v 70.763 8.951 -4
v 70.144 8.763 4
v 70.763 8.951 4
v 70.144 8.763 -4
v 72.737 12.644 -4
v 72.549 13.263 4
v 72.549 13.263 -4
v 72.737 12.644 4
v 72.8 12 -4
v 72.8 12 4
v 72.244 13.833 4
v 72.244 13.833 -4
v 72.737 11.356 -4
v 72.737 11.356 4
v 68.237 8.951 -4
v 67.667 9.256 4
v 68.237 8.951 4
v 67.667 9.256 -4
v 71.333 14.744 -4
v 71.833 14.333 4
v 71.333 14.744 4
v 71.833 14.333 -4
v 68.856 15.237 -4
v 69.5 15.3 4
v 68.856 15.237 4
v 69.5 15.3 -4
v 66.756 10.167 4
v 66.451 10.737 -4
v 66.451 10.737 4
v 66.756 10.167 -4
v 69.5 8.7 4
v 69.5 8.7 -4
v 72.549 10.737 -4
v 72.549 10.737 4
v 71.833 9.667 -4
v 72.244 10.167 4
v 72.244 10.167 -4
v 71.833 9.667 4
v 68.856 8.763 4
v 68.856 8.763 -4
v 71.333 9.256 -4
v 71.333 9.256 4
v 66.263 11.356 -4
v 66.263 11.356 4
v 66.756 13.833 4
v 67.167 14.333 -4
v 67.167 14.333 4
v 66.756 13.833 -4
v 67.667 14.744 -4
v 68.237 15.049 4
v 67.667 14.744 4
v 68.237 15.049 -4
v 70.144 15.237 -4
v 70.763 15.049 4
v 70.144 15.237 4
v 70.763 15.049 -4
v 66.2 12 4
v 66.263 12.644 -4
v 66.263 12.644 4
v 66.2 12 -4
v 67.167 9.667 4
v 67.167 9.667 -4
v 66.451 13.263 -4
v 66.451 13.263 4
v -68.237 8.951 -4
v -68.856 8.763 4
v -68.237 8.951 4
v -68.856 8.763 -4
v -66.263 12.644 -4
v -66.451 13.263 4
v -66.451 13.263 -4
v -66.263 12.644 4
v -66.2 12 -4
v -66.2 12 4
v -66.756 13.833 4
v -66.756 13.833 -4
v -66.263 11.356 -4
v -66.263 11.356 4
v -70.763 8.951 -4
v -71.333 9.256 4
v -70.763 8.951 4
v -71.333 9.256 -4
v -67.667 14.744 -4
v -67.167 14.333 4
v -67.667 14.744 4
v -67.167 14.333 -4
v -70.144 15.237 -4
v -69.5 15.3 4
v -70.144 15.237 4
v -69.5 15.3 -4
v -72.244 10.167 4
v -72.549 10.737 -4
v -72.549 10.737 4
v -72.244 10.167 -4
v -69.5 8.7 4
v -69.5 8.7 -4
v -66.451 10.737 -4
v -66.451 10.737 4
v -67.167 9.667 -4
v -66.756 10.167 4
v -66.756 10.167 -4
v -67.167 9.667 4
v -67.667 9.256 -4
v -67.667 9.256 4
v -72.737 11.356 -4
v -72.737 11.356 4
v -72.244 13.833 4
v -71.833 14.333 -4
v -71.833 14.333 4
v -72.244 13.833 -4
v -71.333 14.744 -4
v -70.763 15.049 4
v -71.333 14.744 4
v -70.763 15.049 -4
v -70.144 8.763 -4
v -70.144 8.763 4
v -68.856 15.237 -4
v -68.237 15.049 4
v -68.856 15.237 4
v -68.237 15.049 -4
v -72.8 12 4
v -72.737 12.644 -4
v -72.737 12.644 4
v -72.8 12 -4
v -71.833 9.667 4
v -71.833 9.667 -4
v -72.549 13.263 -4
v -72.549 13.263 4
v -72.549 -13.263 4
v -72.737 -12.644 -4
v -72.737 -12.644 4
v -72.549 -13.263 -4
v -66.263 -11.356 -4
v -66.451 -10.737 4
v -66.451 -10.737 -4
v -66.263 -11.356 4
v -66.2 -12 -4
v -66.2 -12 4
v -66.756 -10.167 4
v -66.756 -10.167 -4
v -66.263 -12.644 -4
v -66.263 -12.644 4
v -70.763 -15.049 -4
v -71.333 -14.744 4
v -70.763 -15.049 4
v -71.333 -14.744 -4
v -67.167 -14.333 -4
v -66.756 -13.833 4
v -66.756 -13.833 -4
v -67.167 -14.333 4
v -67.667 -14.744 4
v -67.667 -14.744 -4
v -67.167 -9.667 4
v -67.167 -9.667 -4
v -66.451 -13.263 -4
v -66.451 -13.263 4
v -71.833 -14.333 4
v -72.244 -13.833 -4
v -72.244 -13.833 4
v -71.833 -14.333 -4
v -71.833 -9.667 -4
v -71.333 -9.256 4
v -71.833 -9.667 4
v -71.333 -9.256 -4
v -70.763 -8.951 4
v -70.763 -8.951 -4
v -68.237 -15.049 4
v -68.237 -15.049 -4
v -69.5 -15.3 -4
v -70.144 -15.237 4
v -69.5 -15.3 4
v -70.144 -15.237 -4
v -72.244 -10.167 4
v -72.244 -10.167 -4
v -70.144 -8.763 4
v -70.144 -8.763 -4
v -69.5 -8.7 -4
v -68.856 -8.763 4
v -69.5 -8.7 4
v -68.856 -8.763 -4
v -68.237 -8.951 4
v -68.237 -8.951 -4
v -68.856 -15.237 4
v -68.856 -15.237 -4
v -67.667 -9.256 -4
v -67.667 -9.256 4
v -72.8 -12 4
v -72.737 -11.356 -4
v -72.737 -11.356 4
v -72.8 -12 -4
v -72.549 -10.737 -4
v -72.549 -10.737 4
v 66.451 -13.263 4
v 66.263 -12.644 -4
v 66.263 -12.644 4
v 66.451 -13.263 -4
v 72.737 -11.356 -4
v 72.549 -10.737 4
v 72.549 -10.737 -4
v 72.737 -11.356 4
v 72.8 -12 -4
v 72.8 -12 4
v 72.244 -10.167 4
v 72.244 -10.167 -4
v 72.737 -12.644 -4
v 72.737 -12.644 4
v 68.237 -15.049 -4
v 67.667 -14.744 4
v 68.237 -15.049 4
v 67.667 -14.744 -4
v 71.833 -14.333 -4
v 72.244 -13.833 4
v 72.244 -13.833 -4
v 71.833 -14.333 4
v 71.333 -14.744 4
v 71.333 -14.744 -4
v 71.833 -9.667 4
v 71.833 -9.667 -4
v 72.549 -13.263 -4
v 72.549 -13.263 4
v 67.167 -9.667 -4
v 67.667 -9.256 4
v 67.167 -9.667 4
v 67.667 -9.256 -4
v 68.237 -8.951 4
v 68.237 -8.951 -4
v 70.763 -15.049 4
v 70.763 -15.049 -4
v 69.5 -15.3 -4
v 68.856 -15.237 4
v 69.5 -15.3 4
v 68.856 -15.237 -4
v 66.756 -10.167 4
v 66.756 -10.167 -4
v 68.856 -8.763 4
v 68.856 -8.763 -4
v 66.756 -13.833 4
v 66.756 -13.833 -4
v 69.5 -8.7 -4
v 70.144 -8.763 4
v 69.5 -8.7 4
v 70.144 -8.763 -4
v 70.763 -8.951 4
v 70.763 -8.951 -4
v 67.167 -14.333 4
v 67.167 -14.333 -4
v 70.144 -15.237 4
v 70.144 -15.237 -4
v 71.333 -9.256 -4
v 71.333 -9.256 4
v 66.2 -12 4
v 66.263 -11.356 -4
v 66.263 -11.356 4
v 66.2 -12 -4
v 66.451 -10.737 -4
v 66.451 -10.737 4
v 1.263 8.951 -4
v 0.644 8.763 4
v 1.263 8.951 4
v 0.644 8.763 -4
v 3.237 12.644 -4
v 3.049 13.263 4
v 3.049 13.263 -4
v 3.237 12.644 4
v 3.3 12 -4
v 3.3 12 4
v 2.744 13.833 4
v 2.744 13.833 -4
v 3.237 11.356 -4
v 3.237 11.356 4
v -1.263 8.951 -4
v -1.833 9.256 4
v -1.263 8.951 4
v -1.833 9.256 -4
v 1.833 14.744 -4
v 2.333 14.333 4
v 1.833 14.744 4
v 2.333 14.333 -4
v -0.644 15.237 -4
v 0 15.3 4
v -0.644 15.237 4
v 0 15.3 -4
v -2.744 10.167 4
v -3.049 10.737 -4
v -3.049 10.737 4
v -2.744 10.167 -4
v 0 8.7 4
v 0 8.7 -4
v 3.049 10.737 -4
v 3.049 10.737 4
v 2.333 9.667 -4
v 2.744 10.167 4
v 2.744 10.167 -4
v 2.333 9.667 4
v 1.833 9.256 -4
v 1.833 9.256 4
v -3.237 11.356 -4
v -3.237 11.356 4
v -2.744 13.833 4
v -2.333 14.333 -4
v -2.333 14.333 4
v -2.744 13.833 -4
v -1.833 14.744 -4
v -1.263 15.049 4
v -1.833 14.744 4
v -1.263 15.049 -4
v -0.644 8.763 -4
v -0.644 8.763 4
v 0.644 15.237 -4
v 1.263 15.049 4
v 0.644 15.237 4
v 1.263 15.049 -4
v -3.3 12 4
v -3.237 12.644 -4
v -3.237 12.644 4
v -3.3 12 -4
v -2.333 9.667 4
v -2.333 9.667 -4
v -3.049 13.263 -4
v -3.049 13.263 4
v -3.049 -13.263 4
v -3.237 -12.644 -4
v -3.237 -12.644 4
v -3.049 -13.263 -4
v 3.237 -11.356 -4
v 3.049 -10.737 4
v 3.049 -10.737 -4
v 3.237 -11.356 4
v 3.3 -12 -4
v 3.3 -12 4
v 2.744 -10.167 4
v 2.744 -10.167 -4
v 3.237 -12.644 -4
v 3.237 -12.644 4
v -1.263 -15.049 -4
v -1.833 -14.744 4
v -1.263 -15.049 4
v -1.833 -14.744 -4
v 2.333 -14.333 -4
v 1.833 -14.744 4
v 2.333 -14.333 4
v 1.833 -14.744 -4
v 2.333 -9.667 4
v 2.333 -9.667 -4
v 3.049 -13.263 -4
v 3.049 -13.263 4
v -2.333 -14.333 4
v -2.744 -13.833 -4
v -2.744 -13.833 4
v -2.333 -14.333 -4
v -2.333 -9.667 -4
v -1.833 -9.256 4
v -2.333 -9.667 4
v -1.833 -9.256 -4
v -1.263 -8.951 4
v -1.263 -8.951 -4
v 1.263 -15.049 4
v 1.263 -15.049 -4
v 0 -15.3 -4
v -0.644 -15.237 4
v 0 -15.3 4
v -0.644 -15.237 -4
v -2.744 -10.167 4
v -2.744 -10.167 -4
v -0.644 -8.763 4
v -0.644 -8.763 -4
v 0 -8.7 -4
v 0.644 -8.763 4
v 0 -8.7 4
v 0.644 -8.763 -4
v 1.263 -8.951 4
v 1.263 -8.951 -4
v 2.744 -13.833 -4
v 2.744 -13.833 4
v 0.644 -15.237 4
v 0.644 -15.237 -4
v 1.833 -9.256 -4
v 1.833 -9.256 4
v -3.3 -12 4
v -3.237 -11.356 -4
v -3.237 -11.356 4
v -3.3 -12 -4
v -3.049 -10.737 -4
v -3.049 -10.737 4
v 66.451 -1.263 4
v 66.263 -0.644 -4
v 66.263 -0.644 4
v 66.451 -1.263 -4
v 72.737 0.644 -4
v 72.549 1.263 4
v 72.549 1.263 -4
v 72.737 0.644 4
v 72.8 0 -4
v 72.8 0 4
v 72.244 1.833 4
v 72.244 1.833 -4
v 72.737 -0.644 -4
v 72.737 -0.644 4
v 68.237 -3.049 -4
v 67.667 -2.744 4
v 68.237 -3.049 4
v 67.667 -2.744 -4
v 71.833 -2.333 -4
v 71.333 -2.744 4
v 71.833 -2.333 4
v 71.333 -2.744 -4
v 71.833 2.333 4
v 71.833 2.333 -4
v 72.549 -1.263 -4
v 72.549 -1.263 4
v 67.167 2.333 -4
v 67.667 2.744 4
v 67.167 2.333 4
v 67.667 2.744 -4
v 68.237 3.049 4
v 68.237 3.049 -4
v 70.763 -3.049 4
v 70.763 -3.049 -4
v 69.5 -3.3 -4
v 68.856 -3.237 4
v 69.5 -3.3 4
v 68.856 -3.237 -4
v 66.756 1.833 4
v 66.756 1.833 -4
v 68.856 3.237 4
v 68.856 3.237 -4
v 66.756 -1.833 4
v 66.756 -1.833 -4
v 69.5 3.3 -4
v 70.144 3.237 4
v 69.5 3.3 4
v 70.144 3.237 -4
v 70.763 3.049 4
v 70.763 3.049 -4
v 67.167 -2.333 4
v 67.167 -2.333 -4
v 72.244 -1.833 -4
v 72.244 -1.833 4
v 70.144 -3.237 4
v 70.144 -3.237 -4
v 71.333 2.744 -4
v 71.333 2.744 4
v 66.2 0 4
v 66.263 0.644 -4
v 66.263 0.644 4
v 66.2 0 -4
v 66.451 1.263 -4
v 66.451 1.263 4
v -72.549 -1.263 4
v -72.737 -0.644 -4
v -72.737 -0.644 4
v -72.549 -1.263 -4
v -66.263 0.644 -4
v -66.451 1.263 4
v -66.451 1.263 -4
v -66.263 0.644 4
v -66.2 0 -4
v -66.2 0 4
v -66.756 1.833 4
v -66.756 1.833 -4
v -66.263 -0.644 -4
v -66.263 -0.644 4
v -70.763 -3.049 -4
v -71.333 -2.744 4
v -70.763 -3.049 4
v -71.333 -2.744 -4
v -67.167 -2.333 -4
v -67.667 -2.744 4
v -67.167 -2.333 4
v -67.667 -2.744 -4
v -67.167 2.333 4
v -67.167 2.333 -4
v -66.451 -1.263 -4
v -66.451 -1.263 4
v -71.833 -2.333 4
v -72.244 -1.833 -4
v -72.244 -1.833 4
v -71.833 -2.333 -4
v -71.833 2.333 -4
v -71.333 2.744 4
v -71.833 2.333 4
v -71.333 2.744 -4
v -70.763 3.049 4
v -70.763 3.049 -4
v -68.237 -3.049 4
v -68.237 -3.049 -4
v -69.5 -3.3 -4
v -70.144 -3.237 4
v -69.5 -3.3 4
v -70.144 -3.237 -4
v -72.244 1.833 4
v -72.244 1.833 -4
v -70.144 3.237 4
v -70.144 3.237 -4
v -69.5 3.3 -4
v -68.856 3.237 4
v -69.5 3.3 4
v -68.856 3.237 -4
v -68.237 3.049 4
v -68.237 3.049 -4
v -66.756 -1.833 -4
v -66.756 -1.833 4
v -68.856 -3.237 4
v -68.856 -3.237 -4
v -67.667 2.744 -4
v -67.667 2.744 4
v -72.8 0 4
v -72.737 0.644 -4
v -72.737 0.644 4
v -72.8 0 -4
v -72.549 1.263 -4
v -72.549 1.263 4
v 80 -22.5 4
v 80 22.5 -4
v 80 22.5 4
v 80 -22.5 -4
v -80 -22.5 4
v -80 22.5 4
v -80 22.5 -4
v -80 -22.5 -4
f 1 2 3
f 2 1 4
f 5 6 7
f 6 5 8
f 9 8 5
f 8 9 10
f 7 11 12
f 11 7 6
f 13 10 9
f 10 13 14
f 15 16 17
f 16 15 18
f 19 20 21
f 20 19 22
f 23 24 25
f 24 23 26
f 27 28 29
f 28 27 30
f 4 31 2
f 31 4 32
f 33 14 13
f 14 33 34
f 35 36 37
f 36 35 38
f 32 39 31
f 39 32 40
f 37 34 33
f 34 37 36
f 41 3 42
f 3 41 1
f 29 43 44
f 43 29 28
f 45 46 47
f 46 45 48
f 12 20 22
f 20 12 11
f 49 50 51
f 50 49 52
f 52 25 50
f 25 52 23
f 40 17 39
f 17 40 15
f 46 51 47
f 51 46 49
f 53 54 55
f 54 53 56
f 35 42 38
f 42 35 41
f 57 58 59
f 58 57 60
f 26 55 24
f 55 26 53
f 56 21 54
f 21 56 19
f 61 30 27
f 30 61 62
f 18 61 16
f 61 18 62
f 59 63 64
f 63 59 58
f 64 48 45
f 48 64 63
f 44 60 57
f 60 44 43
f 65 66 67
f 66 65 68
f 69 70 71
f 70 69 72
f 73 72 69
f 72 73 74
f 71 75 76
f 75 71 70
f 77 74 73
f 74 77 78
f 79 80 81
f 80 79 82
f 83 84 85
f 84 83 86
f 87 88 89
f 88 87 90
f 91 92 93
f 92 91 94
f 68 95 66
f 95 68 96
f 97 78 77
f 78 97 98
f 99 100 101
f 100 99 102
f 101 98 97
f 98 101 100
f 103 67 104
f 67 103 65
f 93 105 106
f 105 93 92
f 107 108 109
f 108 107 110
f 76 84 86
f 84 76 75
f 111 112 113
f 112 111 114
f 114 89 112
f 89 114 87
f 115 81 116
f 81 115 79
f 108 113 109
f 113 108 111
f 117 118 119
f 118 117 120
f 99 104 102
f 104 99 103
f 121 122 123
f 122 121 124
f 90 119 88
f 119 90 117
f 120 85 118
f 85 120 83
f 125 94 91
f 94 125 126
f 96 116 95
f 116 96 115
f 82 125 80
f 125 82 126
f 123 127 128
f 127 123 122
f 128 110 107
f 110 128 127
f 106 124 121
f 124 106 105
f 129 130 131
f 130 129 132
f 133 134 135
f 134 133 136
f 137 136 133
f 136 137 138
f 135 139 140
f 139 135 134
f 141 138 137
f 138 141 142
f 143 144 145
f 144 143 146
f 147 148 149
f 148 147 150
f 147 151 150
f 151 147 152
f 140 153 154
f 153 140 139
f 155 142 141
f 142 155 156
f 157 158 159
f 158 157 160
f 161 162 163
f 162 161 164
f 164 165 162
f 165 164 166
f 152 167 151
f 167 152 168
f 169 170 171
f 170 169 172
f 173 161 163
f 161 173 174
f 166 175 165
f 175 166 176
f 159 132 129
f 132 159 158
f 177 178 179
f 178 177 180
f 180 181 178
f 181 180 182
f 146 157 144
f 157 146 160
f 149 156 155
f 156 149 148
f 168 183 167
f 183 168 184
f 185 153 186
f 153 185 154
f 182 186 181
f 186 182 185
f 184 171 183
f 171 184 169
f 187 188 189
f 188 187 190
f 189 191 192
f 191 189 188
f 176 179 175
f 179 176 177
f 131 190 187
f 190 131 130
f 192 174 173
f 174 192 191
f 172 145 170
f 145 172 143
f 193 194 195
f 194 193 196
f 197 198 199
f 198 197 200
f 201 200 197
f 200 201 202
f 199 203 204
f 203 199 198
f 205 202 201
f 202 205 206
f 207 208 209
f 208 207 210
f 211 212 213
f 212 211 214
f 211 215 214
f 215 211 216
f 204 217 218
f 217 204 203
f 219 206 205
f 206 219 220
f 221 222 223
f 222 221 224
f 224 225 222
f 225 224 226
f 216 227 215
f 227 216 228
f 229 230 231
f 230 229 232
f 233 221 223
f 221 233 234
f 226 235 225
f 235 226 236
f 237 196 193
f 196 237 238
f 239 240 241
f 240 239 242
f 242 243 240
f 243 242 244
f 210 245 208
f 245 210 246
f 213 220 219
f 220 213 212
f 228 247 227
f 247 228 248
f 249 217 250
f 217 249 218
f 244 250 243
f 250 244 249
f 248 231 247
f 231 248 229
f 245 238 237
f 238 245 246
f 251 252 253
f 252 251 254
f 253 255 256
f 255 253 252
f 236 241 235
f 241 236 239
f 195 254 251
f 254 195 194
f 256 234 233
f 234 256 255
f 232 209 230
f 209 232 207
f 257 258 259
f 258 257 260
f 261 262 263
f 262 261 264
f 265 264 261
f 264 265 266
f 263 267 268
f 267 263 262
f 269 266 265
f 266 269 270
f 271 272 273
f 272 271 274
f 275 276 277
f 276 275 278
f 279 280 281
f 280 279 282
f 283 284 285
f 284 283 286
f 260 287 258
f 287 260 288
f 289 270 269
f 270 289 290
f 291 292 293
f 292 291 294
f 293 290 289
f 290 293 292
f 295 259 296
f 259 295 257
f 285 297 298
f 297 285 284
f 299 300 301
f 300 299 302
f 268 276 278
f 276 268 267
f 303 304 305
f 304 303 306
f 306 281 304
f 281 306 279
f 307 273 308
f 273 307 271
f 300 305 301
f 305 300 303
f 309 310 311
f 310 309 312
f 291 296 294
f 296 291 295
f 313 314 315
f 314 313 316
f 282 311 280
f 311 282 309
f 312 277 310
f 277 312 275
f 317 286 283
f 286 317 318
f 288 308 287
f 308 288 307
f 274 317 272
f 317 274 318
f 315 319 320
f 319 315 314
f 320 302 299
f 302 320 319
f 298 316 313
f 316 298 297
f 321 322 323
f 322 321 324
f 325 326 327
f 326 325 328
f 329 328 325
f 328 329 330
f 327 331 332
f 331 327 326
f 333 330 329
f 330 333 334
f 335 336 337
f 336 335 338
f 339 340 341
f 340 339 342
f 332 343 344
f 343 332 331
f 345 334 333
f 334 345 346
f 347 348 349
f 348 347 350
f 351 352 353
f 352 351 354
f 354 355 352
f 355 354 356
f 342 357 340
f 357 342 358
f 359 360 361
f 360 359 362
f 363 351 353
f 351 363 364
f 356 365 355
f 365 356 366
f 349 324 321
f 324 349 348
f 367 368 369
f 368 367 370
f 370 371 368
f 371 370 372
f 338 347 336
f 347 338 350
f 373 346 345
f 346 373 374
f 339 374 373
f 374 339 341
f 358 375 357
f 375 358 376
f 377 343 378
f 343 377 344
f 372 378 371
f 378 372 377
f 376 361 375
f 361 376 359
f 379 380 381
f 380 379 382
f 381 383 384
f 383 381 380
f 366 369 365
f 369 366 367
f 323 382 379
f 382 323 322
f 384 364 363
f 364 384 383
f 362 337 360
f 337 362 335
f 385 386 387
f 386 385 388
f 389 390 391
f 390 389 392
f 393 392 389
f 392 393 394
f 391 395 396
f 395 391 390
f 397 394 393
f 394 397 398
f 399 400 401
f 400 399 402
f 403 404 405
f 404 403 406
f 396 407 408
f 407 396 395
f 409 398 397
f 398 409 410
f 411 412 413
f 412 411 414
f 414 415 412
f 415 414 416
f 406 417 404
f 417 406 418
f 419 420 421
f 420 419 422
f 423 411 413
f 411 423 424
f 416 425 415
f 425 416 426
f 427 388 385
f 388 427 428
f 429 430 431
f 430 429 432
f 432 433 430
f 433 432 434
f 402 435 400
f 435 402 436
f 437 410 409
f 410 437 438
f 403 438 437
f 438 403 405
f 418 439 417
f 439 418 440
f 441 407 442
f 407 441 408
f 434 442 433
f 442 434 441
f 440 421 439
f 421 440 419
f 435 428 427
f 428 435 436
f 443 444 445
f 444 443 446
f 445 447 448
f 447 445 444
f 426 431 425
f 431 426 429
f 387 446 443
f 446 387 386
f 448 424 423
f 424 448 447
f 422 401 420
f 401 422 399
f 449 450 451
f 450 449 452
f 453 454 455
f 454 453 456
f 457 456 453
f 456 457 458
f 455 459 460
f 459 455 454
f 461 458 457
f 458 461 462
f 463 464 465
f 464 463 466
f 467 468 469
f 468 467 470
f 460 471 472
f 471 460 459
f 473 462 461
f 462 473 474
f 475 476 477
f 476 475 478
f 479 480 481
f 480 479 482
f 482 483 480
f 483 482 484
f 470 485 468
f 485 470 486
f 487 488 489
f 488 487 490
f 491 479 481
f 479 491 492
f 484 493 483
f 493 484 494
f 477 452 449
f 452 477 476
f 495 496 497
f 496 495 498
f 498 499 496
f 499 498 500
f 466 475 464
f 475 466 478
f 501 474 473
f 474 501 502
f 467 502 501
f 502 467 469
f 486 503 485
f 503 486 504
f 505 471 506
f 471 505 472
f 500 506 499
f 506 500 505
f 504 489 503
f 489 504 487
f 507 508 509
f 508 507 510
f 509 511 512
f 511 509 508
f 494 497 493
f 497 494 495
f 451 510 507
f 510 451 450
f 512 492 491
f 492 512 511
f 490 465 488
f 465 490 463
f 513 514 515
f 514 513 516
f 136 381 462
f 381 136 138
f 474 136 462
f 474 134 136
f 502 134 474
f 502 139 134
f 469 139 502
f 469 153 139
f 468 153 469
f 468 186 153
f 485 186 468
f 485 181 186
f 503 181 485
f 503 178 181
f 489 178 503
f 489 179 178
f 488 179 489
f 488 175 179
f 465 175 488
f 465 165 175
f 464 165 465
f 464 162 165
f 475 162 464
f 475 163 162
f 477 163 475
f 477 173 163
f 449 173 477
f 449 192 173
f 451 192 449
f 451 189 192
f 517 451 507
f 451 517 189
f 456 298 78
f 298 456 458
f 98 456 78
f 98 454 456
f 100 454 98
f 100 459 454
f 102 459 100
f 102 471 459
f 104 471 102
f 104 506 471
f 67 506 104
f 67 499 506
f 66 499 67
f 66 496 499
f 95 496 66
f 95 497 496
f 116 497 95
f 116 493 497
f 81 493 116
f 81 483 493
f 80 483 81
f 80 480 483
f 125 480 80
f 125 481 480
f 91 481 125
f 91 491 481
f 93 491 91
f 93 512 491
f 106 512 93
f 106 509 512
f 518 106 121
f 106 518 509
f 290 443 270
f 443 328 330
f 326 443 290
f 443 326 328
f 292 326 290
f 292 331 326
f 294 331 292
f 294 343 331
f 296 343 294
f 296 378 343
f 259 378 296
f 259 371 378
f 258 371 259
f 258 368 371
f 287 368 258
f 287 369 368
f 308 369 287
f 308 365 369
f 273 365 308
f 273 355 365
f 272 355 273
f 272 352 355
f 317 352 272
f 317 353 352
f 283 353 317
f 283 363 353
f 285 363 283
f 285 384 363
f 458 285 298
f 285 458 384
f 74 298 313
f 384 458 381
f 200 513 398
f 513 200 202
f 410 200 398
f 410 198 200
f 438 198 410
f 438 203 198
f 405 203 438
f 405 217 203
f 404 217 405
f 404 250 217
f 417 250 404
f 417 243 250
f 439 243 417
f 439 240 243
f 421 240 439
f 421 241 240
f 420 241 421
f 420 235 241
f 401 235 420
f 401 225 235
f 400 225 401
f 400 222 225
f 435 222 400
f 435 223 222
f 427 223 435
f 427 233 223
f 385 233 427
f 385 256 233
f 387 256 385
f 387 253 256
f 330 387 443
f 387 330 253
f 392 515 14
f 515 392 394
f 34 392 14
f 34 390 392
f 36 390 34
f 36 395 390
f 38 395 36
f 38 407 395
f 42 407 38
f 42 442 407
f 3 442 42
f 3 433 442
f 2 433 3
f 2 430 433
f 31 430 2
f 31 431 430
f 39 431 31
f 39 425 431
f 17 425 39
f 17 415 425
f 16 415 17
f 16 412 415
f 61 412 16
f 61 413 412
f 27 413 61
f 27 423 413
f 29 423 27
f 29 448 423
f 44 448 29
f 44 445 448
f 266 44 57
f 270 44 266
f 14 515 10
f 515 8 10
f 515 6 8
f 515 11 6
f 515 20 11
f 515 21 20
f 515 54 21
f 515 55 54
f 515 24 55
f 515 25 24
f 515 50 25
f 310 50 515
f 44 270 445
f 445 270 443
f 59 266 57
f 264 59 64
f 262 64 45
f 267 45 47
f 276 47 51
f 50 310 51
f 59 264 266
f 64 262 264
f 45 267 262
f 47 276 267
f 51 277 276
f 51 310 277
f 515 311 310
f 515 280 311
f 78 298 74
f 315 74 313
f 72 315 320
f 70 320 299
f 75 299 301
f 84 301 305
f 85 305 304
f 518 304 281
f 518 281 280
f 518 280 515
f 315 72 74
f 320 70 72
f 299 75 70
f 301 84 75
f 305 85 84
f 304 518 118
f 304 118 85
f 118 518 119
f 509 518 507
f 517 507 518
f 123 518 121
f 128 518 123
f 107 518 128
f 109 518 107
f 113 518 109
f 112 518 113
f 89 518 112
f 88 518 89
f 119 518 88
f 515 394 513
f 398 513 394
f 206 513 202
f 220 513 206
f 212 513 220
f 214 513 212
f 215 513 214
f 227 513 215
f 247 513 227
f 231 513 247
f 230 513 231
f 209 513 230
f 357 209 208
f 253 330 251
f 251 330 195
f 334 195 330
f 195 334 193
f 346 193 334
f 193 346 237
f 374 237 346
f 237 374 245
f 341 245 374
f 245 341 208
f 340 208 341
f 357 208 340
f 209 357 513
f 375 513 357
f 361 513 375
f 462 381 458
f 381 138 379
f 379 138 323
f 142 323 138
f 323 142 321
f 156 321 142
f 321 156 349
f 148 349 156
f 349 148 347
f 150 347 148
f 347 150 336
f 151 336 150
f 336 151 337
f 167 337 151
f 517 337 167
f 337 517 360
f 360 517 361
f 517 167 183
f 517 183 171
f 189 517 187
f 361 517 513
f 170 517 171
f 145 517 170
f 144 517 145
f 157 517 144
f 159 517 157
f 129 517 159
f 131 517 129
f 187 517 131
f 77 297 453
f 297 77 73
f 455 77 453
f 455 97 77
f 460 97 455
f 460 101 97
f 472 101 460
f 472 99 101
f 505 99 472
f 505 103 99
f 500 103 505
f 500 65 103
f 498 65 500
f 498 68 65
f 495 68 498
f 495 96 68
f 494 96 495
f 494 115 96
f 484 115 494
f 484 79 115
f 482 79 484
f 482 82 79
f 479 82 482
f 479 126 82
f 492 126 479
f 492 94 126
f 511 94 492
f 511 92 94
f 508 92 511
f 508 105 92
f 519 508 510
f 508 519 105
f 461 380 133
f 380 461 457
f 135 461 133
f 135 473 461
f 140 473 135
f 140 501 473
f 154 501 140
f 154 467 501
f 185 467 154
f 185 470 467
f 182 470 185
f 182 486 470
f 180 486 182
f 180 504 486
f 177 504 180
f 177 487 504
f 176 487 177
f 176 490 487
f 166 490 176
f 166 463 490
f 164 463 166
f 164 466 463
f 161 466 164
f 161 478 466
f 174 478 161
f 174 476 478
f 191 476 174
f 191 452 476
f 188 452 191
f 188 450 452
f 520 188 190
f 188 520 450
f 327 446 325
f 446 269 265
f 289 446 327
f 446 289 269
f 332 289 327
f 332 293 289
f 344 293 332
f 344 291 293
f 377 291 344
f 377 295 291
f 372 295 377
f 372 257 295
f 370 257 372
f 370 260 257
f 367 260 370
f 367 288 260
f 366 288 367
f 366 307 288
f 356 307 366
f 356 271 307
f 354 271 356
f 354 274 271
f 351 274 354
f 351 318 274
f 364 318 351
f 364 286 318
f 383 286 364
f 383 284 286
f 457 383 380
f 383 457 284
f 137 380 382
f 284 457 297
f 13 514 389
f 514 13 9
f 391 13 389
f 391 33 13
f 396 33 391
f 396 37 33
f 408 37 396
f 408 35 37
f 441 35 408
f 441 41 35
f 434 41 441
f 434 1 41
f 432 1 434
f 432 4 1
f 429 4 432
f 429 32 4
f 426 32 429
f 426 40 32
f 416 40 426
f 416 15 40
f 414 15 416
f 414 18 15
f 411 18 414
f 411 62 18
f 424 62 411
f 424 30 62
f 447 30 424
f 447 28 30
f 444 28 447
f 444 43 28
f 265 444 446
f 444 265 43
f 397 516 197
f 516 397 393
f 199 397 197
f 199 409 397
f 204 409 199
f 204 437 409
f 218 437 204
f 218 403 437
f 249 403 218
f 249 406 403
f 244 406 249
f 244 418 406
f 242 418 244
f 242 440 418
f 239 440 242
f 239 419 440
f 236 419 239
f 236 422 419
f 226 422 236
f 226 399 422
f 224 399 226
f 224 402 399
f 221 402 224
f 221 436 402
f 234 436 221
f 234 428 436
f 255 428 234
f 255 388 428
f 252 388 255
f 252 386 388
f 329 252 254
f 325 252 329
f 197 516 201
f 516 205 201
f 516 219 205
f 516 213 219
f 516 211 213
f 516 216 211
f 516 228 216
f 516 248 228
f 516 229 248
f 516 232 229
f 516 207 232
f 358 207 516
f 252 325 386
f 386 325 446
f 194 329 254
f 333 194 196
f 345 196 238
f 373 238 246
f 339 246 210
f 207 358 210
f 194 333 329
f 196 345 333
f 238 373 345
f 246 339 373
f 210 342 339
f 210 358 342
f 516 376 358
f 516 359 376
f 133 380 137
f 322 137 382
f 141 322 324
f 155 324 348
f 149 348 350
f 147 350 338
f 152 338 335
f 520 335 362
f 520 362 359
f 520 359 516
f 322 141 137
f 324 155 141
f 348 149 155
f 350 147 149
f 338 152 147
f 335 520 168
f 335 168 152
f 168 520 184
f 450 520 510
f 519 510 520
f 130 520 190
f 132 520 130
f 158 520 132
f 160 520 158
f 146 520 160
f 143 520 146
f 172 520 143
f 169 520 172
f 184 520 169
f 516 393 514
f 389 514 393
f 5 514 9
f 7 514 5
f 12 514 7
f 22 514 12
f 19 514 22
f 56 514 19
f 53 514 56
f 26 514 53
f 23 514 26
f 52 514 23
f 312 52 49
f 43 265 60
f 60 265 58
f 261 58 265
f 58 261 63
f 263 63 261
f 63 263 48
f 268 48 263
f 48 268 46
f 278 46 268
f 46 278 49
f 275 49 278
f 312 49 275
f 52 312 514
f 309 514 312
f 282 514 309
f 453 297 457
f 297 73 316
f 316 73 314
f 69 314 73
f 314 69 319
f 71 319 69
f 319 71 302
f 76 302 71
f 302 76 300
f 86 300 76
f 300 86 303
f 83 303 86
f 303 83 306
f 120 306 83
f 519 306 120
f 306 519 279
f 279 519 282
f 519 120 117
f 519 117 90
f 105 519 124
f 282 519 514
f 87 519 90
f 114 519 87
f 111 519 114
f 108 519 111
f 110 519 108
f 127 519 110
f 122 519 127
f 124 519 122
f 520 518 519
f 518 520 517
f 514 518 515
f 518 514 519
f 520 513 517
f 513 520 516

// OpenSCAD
$fn = 32;

// ----------------------------------------------------------------------
// Corner plate 160 x 45 x 8
// 8 holes, centres taken from the edge offset
// ----------------------------------------------------------------------

// --- parameters (mm) ---
plate = [160, 45, 8];  // overall size (x, y, z)
holes = 8;             // number of holes the drawing asks for
hole_d = 6.6;          // hole diameter
edge = 10.5;           // hole centre offset from the plate edge

// --- derived feature positions (mm) ---
corner_x = plate[0] / 2 - edge;  // = 69.5   corner hole X
corner_y = plate[1] / 2 - edge;  // = 12   corner hole Y
feature_centers = [
  [corner_x, corner_y],
  [-corner_x, corner_y],
  [-corner_x, -corner_y],
  [corner_x, -corner_y],
  [0, corner_y],
  [0, -corner_y],
  [corner_x, 0],
  [-corner_x, 0]
];   // hole centres the loop below drills

// plate outline, every hole drilled through with the same cutters
difference() {
  cube(plate, center = true);
  for (centre = feature_centers)
    translate([centre[0], centre[1], 0])
      cylinder(d = hole_d, h = plate[2] + 2, center = true);
}
